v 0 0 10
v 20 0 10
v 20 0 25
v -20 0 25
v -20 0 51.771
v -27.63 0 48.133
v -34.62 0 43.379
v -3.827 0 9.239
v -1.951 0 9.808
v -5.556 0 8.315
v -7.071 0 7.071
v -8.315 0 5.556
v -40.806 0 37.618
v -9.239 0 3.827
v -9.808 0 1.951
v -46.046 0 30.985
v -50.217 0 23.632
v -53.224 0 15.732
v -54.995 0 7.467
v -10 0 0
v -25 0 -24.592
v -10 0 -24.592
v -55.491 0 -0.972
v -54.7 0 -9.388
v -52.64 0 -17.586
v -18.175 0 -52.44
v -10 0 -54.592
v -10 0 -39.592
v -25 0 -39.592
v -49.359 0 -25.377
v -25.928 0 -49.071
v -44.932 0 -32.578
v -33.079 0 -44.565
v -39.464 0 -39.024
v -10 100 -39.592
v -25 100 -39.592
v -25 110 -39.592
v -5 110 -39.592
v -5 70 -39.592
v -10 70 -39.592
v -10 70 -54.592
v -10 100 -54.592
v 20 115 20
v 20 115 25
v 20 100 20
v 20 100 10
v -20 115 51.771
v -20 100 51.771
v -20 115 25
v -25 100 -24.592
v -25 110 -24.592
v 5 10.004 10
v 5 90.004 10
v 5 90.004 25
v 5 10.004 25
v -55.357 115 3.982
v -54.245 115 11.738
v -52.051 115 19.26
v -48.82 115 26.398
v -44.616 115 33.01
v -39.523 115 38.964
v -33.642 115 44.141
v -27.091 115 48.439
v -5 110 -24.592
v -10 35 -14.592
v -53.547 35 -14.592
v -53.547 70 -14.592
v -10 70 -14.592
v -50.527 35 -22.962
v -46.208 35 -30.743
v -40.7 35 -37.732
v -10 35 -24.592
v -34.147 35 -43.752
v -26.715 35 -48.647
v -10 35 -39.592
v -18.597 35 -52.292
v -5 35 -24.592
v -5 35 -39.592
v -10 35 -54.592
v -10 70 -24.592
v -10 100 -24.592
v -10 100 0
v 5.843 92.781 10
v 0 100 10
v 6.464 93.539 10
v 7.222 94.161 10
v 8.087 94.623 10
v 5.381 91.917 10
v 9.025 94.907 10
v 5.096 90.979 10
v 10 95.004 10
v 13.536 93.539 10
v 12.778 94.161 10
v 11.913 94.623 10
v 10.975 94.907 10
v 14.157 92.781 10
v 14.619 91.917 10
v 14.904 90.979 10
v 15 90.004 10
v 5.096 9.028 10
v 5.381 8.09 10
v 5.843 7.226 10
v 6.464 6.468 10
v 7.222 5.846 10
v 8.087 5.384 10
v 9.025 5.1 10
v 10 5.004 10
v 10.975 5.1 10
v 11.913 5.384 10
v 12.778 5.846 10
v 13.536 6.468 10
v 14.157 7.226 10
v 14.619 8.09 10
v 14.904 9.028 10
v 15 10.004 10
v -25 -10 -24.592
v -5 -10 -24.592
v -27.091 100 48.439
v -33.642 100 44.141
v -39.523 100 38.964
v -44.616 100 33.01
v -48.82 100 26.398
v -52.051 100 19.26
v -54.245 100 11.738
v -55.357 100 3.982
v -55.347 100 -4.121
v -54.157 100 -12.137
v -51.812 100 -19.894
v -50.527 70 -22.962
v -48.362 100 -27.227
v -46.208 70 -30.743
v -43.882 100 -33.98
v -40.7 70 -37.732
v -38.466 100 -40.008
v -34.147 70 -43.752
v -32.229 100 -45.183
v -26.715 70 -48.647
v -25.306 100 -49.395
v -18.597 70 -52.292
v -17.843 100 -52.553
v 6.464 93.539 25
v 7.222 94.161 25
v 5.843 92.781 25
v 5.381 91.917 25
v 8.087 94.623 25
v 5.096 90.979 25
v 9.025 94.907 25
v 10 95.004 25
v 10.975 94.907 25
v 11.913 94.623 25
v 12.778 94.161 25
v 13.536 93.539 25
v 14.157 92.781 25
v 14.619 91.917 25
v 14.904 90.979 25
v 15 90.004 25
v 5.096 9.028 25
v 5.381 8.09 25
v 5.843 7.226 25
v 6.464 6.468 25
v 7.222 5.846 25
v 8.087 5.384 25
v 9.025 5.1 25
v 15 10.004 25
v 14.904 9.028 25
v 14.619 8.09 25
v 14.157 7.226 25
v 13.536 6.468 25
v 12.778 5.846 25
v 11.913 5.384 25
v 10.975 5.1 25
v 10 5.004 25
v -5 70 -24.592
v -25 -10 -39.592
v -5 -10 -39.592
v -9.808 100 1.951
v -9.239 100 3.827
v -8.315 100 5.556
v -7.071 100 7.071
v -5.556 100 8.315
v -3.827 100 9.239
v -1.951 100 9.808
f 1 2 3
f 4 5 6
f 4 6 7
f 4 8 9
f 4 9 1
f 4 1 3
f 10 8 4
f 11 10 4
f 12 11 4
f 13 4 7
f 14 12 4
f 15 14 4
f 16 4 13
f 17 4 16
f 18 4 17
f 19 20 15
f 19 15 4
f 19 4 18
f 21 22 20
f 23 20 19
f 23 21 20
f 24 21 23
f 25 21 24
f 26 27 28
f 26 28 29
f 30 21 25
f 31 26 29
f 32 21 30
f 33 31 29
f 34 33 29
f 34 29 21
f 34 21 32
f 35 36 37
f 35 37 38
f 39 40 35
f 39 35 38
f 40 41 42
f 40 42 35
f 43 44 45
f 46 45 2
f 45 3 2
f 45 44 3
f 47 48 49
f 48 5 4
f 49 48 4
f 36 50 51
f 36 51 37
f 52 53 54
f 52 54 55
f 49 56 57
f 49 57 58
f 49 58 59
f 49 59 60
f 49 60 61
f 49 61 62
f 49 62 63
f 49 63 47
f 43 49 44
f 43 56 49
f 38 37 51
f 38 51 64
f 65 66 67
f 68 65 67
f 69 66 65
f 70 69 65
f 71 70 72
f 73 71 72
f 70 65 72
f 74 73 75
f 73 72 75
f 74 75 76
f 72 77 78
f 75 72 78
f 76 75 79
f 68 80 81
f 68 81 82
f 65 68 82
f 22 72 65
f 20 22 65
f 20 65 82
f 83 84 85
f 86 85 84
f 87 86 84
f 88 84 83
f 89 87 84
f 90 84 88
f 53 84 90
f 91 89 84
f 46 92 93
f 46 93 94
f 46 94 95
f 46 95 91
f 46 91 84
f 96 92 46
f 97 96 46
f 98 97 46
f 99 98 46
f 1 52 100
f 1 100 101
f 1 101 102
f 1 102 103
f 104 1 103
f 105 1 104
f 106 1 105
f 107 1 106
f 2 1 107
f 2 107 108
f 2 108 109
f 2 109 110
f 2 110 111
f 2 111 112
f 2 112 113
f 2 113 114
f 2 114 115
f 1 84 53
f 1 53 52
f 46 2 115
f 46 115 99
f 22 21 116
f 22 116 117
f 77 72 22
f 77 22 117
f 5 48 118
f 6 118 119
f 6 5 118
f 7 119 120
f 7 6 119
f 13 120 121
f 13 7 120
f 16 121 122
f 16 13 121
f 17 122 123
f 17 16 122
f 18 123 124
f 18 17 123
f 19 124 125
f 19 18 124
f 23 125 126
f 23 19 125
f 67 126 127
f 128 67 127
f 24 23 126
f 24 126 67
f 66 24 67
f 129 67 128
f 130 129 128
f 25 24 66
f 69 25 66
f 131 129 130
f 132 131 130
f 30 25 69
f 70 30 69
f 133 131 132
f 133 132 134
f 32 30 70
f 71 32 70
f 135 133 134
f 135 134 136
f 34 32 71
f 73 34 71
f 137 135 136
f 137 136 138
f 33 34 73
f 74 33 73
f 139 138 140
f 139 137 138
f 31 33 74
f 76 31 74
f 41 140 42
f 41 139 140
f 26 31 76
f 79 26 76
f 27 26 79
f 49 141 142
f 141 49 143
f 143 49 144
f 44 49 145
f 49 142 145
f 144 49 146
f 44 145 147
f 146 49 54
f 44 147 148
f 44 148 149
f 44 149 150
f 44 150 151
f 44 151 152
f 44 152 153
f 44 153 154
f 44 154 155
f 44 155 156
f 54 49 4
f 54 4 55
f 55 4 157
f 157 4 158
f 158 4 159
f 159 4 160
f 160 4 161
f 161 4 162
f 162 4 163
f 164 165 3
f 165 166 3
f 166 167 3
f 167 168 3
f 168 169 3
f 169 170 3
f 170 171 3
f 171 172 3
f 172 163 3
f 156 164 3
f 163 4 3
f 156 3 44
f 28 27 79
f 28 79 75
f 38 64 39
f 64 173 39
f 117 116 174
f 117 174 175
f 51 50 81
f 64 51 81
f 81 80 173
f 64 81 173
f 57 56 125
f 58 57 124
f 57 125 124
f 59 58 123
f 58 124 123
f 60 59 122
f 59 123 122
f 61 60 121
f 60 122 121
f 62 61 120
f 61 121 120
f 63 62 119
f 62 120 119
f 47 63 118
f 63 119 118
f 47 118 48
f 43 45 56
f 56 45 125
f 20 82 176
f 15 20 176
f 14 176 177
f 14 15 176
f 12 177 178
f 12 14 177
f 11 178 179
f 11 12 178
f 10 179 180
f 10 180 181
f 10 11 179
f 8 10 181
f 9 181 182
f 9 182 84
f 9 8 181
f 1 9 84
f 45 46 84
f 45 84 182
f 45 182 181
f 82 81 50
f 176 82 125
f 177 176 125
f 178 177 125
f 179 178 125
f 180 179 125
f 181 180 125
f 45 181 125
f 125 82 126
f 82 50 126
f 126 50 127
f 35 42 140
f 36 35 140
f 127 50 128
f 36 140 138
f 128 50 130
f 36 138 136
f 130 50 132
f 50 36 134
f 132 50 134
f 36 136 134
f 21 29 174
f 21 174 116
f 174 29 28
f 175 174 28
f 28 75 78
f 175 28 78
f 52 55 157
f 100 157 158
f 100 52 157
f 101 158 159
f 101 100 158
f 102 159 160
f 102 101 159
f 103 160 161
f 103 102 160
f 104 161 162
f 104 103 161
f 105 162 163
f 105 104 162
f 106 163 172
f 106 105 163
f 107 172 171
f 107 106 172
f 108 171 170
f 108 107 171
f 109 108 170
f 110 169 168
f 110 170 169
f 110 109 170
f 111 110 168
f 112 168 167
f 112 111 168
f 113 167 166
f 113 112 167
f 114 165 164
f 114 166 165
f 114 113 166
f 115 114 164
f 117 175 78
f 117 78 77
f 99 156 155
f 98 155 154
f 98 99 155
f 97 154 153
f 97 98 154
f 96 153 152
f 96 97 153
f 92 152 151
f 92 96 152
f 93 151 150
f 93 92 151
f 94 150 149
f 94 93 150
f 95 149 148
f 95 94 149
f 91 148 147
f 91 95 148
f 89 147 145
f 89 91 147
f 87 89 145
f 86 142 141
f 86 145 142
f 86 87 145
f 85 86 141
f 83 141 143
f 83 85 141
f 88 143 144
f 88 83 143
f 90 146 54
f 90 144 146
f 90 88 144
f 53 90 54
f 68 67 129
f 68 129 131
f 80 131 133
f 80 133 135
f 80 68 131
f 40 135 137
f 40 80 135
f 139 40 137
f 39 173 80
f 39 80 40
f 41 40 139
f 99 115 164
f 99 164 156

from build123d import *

# Parameters (mm, degrees)
BOSS_EXTRUDE1_DEPTH = 100
CUT_EXTRUDE1_DEPTH  = 100
BOSS_EXTRUDE2_DEPTH = 15
SKETCH4_W           = 40
SKETCH4_H           = 35
CUT_EXTRUDE2_DEPTH  = 137.950721064
SKETCH5_W           = 20
SKETCH5_H           = 15
BOSS_EXTRUDE3_DEPTH = 10
SKETCH6_W           = 20
SKETCH6_H           = 15
BOSS_EXTRUDE4_DEPTH = 10


with BuildPart() as part:
    # Sketch1 → Boss-Extrude1 (new body)
    with BuildSketch(Plane(origin=(0, 0, 0), x_dir=(1, 0, 0), z_dir=(0, 1, 0))):
        with BuildLine():
            Line((-10, 54.591666031), (-10, 39.591666031))
            Line((-10, 39.591666031), (-5, 39.591666031))
            Line((-5, 39.591666031), (-5, 24.591666031))
            Line((-5, 24.591666031), (-10, 24.591666031))
            Line((-10, 24.591666031), (-10, 0))
            ThreePointArc((-10, 0), (-7.071067812, -7.071067812), (0, -10))
            Line((0, -10), (20, -10))
            Line((20, -10), (20, -25))
            Line((20, -25), (-20, -25))
            Line((-20, -25), (-20, -51.771130952))
            ThreePointArc((-20, -51.771130952), (-55.256322222, 5.195079839), (-10, 54.591666031))
        make_face()
    extrude(amount=BOSS_EXTRUDE1_DEPTH)

    # Sketch2 → Cut-Extrude1 (cut)
    with BuildSketch(Plane(origin=(0, 0, 10), x_dir=(-1, 0, 0), z_dir=(0, 0, -1))):
        with BuildLine():
            Line((-5, 90.003555636), (-5, 10.003555636))
            ThreePointArc((-5, 10.003555636), (-10, 5.003555636), (-15, 10.003555636))
            Line((-15, 10.003555636), (-15, 90.003555636))
            ThreePointArc((-15, 90.003555636), (-10, 95.003555636), (-5, 90.003555636))
        make_face()
    extrude(amount=-CUT_EXTRUDE1_DEPTH, mode=Mode.SUBTRACT)

    # Sketch3 → Boss-Extrude2 (add)
    with BuildSketch(Plane(origin=(0, 100, 0), x_dir=(1, 0, 0), z_dir=(0, 1, 0))):
        with BuildLine():
            Line((20, -25), (20, -20))
            Line((20, -20), (-55.356937984, -3.982388364))
            ThreePointArc((-55.356937984, -3.982388364), (-44.616230288, -33.009725763), (-20, -51.771130952))
            Line((-20, -51.771130952), (-20, -25))
            Line((-20, -25), (20, -25))
        make_face()
    extrude(amount=BOSS_EXTRUDE2_DEPTH)

    # Sketch4 → Cut-Extrude2 (cut, through all)
    with BuildSketch(Plane(origin=(-5, 0, 0), x_dir=(0, 0, -1), z_dir=(1, 0, 0))):
        with Locations((34.591666031, 52.5)):
            Rectangle(SKETCH4_W, SKETCH4_H)
    extrude(amount=-CUT_EXTRUDE2_DEPTH, mode=Mode.SUBTRACT)

    # Sketch5 → Boss-Extrude3 (add)
    with BuildSketch(Plane(origin=(0, 100, 0), x_dir=(1, 0, 0), z_dir=(0, 1, 0))):
        with Locations((-15, 32.091666031)):
            Rectangle(SKETCH5_W, SKETCH5_H)
    extrude(amount=BOSS_EXTRUDE3_DEPTH)

    # Sketch6 → Boss-Extrude4 (add)
    with BuildSketch(Plane.XZ):
        with Locations((-15, -32.091666031)):
            Rectangle(SKETCH6_W, SKETCH6_H)
    extrude(amount=BOSS_EXTRUDE4_DEPTH)


solid = part.part
